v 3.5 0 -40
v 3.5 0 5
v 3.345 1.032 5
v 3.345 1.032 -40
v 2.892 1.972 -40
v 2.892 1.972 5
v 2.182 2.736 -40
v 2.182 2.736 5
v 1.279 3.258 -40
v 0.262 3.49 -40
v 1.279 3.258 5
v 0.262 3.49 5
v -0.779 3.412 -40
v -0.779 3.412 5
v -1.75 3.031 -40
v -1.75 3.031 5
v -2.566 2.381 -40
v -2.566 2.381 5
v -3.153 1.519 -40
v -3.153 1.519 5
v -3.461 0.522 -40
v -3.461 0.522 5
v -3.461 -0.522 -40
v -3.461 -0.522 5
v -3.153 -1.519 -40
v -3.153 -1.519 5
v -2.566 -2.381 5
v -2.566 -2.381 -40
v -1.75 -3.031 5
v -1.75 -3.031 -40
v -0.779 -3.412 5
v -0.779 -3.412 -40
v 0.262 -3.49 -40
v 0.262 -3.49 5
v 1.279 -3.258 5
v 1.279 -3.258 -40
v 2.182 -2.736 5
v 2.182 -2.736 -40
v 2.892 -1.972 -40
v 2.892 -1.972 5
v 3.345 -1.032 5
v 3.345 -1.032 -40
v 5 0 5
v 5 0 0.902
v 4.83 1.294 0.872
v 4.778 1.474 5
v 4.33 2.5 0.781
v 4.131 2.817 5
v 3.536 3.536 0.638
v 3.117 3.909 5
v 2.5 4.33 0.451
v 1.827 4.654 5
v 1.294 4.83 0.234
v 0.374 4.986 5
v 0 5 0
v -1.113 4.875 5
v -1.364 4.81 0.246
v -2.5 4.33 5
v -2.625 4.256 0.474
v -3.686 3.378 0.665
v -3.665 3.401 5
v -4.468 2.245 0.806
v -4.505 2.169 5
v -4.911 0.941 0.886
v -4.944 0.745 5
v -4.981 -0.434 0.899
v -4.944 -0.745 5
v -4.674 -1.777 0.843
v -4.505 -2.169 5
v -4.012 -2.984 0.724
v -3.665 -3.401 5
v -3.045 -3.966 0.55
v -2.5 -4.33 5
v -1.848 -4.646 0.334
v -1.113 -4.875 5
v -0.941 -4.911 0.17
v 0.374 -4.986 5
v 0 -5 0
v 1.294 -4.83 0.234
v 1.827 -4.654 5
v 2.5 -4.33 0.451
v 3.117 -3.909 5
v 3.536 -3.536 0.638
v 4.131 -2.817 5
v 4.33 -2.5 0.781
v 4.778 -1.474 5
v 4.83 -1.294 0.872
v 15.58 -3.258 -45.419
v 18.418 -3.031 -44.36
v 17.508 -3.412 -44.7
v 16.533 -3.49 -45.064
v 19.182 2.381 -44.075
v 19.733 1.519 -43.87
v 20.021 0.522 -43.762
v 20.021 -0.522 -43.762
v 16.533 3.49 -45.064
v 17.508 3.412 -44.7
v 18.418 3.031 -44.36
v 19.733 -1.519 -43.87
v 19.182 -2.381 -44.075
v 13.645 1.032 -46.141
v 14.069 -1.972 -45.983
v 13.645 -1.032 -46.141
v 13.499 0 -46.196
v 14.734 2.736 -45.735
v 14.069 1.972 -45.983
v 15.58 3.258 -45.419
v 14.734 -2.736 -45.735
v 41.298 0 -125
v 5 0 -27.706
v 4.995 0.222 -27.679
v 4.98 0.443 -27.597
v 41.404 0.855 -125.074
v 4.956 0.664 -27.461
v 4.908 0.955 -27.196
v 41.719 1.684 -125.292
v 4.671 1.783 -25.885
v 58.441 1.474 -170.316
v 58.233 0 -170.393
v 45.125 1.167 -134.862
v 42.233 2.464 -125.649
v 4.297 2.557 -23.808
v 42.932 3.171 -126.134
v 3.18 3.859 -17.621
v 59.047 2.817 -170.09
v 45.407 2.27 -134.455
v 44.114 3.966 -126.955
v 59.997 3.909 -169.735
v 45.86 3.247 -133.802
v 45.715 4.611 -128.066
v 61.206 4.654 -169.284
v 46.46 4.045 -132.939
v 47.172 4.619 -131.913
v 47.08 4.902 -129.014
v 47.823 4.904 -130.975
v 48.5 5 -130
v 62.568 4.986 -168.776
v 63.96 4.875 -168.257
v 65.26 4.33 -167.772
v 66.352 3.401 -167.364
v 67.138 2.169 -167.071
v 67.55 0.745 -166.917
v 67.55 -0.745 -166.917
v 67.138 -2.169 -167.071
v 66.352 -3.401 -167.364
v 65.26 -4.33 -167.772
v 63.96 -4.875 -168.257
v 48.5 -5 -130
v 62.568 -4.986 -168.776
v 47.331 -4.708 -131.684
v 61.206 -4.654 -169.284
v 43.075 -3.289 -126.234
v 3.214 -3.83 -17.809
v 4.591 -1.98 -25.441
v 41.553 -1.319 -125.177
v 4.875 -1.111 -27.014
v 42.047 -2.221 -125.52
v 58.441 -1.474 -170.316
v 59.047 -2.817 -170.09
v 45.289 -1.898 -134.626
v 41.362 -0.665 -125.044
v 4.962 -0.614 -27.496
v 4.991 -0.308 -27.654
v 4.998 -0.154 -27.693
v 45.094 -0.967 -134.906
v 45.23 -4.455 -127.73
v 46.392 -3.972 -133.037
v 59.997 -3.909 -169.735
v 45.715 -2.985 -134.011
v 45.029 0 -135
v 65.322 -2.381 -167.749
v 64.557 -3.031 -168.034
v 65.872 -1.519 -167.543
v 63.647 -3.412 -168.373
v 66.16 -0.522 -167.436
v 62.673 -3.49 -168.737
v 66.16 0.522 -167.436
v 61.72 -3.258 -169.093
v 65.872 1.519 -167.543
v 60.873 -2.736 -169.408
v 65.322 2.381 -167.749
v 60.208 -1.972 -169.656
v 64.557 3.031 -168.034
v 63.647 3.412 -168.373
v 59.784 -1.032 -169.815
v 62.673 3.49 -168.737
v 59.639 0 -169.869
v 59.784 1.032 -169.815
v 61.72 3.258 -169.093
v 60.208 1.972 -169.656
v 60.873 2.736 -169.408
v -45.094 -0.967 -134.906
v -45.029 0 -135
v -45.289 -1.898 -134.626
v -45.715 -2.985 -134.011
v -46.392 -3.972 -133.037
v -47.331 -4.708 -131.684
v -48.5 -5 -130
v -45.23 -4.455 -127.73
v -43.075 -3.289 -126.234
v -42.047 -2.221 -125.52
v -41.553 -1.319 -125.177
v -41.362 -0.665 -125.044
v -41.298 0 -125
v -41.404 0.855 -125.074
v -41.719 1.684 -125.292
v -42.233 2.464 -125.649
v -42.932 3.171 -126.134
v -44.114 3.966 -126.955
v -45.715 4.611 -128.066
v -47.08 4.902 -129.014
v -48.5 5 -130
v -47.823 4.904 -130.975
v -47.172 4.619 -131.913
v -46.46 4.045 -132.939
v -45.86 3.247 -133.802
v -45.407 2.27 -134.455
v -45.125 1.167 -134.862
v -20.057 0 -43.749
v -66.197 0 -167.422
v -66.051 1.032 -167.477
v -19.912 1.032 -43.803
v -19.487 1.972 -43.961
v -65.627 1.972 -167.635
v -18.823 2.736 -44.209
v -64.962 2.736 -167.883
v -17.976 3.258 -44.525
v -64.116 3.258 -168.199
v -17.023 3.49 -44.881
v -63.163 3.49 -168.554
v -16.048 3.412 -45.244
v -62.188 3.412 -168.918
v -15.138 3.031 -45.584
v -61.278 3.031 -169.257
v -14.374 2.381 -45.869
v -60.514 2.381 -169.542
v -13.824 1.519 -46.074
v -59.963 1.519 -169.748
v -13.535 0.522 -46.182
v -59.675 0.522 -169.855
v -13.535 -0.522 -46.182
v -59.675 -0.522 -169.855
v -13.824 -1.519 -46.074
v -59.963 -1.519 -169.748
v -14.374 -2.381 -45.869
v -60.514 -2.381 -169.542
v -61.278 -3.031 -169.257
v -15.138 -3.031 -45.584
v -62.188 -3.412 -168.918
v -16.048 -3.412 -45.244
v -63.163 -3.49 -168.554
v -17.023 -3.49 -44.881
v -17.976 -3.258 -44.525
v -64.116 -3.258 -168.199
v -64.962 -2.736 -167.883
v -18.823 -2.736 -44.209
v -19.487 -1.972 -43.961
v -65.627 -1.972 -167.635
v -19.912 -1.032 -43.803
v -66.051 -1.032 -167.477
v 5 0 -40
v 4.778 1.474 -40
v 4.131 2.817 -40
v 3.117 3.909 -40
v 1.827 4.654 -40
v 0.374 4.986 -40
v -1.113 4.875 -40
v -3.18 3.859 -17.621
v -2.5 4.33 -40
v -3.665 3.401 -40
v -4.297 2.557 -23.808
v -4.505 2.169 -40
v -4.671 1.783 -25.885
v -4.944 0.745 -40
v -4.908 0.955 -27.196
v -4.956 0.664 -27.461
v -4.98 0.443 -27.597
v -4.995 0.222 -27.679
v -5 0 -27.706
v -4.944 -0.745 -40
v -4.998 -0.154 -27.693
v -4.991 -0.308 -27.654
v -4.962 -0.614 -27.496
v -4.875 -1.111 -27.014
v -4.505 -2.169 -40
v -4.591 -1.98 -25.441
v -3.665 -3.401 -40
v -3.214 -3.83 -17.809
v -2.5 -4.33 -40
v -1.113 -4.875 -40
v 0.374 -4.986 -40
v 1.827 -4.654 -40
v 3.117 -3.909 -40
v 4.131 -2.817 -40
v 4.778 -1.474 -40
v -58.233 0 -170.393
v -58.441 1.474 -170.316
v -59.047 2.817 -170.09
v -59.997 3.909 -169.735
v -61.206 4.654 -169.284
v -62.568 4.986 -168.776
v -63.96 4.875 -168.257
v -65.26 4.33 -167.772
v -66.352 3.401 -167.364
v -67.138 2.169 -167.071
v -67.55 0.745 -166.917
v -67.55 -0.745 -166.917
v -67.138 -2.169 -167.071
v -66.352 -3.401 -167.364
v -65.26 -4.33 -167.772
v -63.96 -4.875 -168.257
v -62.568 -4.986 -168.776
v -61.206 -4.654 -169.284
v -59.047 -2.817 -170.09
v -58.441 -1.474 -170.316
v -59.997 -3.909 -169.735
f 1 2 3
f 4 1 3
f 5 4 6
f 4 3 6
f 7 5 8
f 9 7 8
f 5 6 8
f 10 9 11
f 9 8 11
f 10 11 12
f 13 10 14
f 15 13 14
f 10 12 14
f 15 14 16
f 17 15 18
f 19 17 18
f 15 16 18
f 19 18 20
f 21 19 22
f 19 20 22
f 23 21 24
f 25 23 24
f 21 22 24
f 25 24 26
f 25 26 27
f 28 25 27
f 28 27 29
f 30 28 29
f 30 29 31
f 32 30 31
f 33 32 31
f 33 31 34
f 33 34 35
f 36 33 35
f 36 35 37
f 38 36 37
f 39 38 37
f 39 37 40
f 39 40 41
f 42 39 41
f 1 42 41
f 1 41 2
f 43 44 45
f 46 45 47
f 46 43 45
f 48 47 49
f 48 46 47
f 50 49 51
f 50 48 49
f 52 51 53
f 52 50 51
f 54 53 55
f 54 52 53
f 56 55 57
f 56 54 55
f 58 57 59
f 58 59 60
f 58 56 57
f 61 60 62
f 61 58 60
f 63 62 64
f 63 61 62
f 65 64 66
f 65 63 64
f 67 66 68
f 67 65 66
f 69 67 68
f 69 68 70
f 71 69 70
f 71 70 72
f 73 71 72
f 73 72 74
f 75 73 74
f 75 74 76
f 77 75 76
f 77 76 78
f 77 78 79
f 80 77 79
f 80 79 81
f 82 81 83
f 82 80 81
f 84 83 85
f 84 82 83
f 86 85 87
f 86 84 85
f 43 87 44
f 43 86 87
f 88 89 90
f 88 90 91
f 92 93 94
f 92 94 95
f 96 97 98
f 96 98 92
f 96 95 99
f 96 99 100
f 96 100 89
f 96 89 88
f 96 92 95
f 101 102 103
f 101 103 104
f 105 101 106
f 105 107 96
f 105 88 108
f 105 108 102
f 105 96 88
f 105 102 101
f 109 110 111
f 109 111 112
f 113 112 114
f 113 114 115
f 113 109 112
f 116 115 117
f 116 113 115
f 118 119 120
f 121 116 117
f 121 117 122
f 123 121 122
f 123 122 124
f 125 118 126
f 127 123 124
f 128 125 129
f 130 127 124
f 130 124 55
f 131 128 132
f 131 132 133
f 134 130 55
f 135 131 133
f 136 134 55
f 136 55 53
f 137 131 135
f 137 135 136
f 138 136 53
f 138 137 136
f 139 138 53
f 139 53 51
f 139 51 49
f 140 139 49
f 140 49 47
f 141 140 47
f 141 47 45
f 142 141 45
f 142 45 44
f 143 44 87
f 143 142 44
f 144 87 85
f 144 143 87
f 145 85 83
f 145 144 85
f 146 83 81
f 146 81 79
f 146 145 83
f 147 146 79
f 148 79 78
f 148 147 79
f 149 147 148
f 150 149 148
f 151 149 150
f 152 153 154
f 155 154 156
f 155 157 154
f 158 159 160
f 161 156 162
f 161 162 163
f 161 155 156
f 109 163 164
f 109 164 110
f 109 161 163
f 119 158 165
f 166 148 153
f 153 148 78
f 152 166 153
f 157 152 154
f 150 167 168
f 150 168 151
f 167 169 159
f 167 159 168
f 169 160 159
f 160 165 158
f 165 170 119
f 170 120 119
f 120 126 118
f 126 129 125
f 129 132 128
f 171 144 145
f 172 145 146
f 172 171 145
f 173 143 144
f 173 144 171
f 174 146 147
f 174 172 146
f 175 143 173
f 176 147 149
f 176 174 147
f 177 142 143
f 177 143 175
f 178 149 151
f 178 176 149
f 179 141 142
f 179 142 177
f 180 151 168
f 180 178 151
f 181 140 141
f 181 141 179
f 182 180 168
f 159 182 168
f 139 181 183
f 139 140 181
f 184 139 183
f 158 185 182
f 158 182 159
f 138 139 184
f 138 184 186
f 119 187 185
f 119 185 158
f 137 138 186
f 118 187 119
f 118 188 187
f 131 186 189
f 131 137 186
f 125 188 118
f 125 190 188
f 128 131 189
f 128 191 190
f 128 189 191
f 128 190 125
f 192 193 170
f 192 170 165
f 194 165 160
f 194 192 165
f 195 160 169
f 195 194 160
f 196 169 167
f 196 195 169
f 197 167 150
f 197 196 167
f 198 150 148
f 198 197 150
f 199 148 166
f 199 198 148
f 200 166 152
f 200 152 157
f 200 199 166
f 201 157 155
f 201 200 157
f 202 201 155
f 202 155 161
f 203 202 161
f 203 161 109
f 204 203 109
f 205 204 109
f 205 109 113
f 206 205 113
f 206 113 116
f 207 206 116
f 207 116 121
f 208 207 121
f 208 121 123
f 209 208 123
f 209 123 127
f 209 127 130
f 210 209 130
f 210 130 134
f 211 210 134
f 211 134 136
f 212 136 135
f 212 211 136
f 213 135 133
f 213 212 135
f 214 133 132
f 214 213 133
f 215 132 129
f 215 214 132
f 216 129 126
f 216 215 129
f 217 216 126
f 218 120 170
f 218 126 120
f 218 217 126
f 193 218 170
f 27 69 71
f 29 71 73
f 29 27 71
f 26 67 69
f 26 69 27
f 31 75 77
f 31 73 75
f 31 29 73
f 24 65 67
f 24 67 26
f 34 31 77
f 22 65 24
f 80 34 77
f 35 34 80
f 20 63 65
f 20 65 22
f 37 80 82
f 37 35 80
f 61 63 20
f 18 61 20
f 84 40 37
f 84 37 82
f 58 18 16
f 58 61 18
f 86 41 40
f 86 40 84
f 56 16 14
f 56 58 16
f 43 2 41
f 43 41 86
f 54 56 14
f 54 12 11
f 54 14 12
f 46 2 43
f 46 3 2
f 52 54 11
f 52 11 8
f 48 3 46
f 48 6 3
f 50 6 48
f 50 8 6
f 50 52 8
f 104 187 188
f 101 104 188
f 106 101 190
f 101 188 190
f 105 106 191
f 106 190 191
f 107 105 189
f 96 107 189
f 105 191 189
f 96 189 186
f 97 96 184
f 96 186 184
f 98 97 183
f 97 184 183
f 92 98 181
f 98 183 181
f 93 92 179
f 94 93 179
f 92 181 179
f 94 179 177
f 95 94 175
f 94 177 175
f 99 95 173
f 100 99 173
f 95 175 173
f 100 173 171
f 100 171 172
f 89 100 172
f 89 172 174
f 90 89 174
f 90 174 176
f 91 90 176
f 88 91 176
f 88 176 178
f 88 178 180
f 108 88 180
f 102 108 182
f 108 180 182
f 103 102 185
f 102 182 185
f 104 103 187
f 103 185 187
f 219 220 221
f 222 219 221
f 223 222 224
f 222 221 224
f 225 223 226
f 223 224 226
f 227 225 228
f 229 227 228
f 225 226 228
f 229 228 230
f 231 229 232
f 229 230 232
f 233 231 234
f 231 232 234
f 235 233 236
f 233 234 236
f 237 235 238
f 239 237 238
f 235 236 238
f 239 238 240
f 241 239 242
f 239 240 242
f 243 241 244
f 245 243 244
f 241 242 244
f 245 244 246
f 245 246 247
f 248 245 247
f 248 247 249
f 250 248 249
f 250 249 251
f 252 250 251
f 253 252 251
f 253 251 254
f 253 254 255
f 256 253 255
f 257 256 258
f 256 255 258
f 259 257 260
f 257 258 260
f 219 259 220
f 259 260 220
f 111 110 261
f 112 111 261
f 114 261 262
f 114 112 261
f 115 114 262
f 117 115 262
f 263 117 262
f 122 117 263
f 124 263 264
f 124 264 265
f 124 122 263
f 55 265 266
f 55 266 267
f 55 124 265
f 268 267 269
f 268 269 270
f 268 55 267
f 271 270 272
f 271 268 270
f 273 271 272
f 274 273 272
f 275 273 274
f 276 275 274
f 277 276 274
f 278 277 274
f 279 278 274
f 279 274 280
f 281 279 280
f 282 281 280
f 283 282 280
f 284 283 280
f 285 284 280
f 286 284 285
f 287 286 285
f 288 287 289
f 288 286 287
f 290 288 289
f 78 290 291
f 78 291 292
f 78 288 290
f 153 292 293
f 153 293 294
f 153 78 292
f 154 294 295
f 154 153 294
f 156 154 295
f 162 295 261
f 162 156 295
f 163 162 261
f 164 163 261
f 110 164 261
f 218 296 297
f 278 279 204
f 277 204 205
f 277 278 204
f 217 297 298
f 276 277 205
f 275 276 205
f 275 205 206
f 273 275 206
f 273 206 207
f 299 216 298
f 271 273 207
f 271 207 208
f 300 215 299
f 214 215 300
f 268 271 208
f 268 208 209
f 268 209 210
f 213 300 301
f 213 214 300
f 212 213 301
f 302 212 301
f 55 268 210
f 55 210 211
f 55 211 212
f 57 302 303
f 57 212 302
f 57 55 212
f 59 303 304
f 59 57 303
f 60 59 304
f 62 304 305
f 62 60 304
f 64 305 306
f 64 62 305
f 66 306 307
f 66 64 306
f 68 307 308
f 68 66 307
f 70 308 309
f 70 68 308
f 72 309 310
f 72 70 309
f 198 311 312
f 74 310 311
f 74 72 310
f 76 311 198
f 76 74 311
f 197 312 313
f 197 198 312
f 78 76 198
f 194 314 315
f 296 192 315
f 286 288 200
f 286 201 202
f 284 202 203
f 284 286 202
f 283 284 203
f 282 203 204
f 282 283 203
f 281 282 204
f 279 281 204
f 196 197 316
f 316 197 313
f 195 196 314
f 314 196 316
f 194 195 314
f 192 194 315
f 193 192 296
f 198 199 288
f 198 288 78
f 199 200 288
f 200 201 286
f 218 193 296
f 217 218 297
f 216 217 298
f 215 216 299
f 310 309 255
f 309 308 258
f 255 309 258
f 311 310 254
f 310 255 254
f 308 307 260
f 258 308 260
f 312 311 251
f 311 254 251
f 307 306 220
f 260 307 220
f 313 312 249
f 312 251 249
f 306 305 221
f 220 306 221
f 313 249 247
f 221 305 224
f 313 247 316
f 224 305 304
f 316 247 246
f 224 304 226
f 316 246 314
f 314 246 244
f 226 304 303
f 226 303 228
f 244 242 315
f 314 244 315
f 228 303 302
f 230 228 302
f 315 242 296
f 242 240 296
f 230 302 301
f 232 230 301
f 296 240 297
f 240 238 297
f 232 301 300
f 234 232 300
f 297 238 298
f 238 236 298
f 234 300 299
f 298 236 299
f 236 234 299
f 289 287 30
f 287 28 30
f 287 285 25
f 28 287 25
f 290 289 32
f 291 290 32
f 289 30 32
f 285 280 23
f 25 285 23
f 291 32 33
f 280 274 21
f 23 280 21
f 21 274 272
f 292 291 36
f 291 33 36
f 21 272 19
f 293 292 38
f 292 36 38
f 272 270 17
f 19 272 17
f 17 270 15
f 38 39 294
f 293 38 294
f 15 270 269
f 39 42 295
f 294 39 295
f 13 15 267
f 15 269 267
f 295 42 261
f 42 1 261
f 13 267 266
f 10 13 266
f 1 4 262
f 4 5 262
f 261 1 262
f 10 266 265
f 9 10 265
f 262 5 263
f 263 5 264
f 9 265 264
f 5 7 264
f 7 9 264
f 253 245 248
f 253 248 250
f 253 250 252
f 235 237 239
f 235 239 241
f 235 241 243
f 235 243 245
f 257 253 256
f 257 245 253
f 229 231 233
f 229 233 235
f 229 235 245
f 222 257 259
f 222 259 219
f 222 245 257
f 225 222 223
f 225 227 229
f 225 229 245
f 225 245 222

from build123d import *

# Parameters (mm, degrees)
SWEEP1_PROFILE_R   = 5
SWEEP4_PROFILE_R   = 5
SWEEP5_PROFILE_R   = 5
SPLIT1_START       = 5
SPLIT1_OUTLINE_W   = 10
SPLIT1_OUTLINE_H   = 12
SPLIT1_DEPTH       = 9.304379119
SKETCH37_R         = 3.5
CUT_EXTRUDE1_DEPTH = 49
SKETCH38_R         = 3.5
CUT_EXTRUDE2_DEPTH = 132
SKETCH39_R         = 3.5
CUT_EXTRUDE3_DEPTH = 132


# Read off the part's stored shape, not the designer's step: Split1
with BuildPart() as part:
    # Sweep1: sweep along a path in Sketch1
    with BuildLine(Plane(origin=(0, 0, 0), x_dir=(1, 0, 0), z_dir=(0, 1, 0))) as sweep1_path:
        Line((-62.917795488, 168.645637391), (0, 0))
        Line((0, 0), (62.917795488, 168.645637391))
    # Sweep1 profile (on start of the path) → Sweep1 (sweep)
    with BuildSketch(Plane(origin=(-62.917795488, 0, -168.645637391), x_dir=(0.936920207726199, 0, -0.349543308267082), z_dir=(0.349543308267082, 0, 0.936920207726199))):
        Circle(SWEEP1_PROFILE_R)
    sweep(path=sweep1_path.line, transition=Transition.RIGHT)

    # Sweep4: sweep along a path in Sketch1<7>
    with BuildLine(Plane(origin=(0, 0, 0), x_dir=(1, 0, 0), z_dir=(0, 1, 0))) as sweep4_path:
        Line((0, 40), (0, -5))
    # Sweep4 profile (on start of the path) → Sweep4 (sweep)
    with BuildSketch(Plane.XY.offset(-40)):
        Circle(SWEEP4_PROFILE_R)
    sweep(path=sweep4_path.line)

    # Sweep5: sweep along a path in Sketch1<8>
    with BuildLine(Plane(origin=(0, 0, 0), x_dir=(1, 0, 0), z_dir=(0, 1, 0))) as sweep5_path:
        Line((48.5, 130), (-48.5, 130))
    # Sweep5 profile (on start of the path) → Sweep5 (sweep)
    with BuildSketch(Plane(origin=(48.5, 0, -130), x_dir=(0, 0, -1), z_dir=(-1, 0, 0))):
        Circle(SWEEP5_PROFILE_R)
    sweep(path=sweep5_path.line)

    # Split1 outline → Split1 (cut)
    with BuildSketch(Plane.XY.offset(SPLIT1_START)):
        Rectangle(SPLIT1_OUTLINE_W, SPLIT1_OUTLINE_H)
    extrude(amount=SPLIT1_DEPTH, mode=Mode.SUBTRACT)

    # Sketch37 → Cut-Extrude1 (cut)
    with BuildSketch(Plane.XY.offset(5)):
        Circle(SKETCH37_R)
    extrude(amount=-CUT_EXTRUDE1_DEPTH, mode=Mode.SUBTRACT)

    # Sketch38 → Cut-Extrude2 (cut)
    with BuildSketch(Plane(origin=(-62.917795488, 0, -168.645637391), x_dir=(-0.9369202077261991, 0, 0.34954330826708174), z_dir=(-0.34954330826708174, 0, -0.9369202077261991))):
        Circle(SKETCH38_R)
    extrude(amount=-CUT_EXTRUDE2_DEPTH, mode=Mode.SUBTRACT)

    # Sketch39 → Cut-Extrude3 (cut)
    with BuildSketch(Plane(origin=(62.917795488, 0, -168.645637391), x_dir=(-0.9369202077261989, 0, -0.3495433082670822), z_dir=(0.3495433082670822, 0, -0.9369202077261989))):
        Circle(SKETCH39_R)
    extrude(amount=-CUT_EXTRUDE3_DEPTH, mode=Mode.SUBTRACT)


solid = part.part
